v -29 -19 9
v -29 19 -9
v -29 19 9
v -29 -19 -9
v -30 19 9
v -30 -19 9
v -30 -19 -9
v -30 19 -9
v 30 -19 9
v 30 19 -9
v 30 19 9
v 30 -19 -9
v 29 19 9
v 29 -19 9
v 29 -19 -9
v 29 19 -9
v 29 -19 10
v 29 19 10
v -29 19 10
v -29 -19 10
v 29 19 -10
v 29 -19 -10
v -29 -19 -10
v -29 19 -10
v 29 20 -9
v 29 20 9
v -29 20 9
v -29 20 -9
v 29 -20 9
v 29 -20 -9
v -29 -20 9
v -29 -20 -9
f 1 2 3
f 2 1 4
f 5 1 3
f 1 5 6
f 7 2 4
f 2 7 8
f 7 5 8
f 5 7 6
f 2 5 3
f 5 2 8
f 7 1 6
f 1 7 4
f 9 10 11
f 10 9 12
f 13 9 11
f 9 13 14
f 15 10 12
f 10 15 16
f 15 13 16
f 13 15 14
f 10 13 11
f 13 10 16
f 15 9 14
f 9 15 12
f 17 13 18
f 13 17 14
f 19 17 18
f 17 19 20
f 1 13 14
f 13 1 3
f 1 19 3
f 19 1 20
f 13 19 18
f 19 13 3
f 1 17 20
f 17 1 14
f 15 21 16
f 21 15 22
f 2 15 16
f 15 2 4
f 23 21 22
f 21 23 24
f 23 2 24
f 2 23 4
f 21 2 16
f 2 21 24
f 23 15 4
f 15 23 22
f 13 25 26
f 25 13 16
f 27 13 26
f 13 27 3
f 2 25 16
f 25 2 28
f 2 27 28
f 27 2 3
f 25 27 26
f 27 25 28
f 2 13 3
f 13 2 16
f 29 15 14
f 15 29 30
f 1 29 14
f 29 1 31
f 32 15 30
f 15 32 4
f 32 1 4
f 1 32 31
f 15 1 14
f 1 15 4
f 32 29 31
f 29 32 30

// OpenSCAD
module aesthetic_cube(
    width,
    depth,
    height,
    inset,
    leftFace = true,
    rightFace = true,
    topFace = true,
    bottomFace = true,
    backFace = true,
    frontFace = true,
    leftTopEdge = true,
    rightTopEdge = true,
    leftBottomEdge = true,
    rightBottomEdge = true,
    leftBackEdge = true,
    rightBackEdge = true,
    leftFrontEdge = true,
    rightFrontEdge = true,
    topBackEdge = true,
    topFrontEdge = true,
    bottomBackEdge = true,
    bottomFrontEdge = true,
    leftTopBackCorner = true,
    leftTopFrontCorner = true,
    rightTopBackCorner = true,
    rightTopFrontCorner = true,
    leftBottomBackCorner = true,
    leftBottomFrontCorner = true,
    rightBottomBackCorner = true,
    rightBottomFrontCorner = true,
 ) {
    if (leftFace) {
        translate([-width / 2, -depth / 2 + inset, inset])
        cube([inset, depth - inset * 2, height - inset * 2]);
    }

    if (rightFace) {
        translate([width / 2 - inset, -depth / 2 + inset, inset])
        cube([inset, depth - inset * 2, height - inset * 2]);
    }

    if (topFace) {
        translate([-width / 2 + inset, -depth / 2 + inset, height - inset])
        cube([width - inset * 2, depth - inset * 2, inset]);
    }
    
    if (bottomFace) {
        translate([-width / 2 + inset, -depth / 2 + inset])
        cube([width - inset * 2, depth - inset * 2, inset]);
    }

    if (backFace) {
        translate([-width / 2 + inset, depth / 2 - inset, inset])
        cube([width - inset * 2, inset, height - inset * 2]);
    }
    
    if (frontFace) {
        translate([-width / 2 + inset, -depth / 2, inset])
        cube([width - inset * 2, inset, height - inset * 2]);
    }
    
    if (leftTopEdge) {
        translate([-width / 2, -depth / 2 + inset, height - inset])
        cube([inset, depth - inset * 2, inset]);
    }
    
    if (rightTopEdge) {
        translate([width / 2 - inset, -depth / 2 + inset, height - inset])
        cube([inset, depth - inset * 2, inset]);
    }
    
    if (leftBottomEdge) {
        translate([-width / 2, -depth / 2 + inset])
        cube([inset, depth - inset * 2, inset]);
    }
    
    if (rightBottomEdge) {
        translate([width / 2 - inset, -depth / 2 + inset])
        cube([inset, depth - inset * 2, inset]);
    }
    
    if (leftBackEdge) {
        translate([-width / 2, depth / 2 - inset, inset])
        cube([inset, inset, height - inset * 2]);
    }
    
    if (rightBackEdge) {
        translate([width / 2 - inset, depth / 2 - inset, inset])
        cube([inset, inset, height - inset * 2]);
    }
    
    if (leftFrontEdge) {
        translate([-width / 2, -depth / 2, inset])
        cube([inset, inset, height - inset * 2]);
    }
    
    if (rightFrontEdge) {
        translate([width / 2 - inset, -depth / 2, inset])
        cube([inset, inset, height - inset * 2]);
    }
    
    if (topBackEdge) {
        translate([-width / 2 + inset, depth / 2 - inset, height - inset])
        cube([width - inset * 2, inset, inset]);
    }
    
    if (topFrontEdge) {
        translate([-width / 2 + inset, -depth / 2, height - inset])
        cube([width - inset * 2, inset, inset]);
    }
    
    if (bottomBackEdge) {
        translate([-width / 2 + inset, depth / 2 - inset])
        cube([width - inset * 2, inset, inset]);
    }
    
    if (bottomFrontEdge) {
        translate([-width / 2 + inset, -depth / 2])
        cube([width - inset * 2, inset, inset]);
    }
    
    if (leftTopBackCorner) {
        translate([-width / 2, depth / 2 - inset, height - inset])
        cube(inset);
    }
    
    if (leftTopFrontCorner) {
        translate([-width / 2, -depth / 2, height - inset])
        cube(inset);
    }
    
    if (rightTopBackCorner) {
        translate([width / 2 - inset, depth / 2 - inset, height - inset])
        cube(inset);
    }
    
    if (rightTopFrontCorner) {
        translate([width / 2 - inset, -depth / 2, height - inset])
        cube(inset);
    }
    
    if (leftBottomBackCorner) {
        translate([-width / 2, depth / 2 - inset])
        cube(inset);
    }
    
    if (leftBottomFrontCorner) {
        translate([-width / 2, -depth / 2])
        cube(inset);
    }
    
    if (rightBottomBackCorner) {
        translate([width / 2 - inset, depth / 2 - inset])
        cube(inset);
    }
    
    if (rightBottomFrontCorner) {
        translate([width / 2 - inset, -depth / 2])
        cube(inset);
    }
}

translate([0, 0, -10])
color([.75, .5, .35, .5])
aesthetic_cube(
    60,
    40,
    20,
    1,
    leftFace = true,
    rightFace = true,
    topFace = true,
    bottomFace = true,
    backFace = true,
    frontFace = true,
    leftTopEdge = false,
    rightTopEdge = false,
    leftBottomEdge = false,
    rightBottomEdge = false,
    leftBackEdge = false,
    rightBackEdge = false,
    leftFrontEdge = false,
    rightFrontEdge = false,
    topBackEdge = false,
    topFrontEdge = false,
    bottomBackEdge = false,
    bottomFrontEdge = false,
    leftTopBackCorner = false,
    leftTopFrontCorner = false,
    rightTopBackCorner = false,
    rightTopFrontCorner = false,
    leftBottomBackCorner = false,
    leftBottomFrontCorner = false,
    rightBottomBackCorner = false,
    rightBottomFrontCorner = false
);
